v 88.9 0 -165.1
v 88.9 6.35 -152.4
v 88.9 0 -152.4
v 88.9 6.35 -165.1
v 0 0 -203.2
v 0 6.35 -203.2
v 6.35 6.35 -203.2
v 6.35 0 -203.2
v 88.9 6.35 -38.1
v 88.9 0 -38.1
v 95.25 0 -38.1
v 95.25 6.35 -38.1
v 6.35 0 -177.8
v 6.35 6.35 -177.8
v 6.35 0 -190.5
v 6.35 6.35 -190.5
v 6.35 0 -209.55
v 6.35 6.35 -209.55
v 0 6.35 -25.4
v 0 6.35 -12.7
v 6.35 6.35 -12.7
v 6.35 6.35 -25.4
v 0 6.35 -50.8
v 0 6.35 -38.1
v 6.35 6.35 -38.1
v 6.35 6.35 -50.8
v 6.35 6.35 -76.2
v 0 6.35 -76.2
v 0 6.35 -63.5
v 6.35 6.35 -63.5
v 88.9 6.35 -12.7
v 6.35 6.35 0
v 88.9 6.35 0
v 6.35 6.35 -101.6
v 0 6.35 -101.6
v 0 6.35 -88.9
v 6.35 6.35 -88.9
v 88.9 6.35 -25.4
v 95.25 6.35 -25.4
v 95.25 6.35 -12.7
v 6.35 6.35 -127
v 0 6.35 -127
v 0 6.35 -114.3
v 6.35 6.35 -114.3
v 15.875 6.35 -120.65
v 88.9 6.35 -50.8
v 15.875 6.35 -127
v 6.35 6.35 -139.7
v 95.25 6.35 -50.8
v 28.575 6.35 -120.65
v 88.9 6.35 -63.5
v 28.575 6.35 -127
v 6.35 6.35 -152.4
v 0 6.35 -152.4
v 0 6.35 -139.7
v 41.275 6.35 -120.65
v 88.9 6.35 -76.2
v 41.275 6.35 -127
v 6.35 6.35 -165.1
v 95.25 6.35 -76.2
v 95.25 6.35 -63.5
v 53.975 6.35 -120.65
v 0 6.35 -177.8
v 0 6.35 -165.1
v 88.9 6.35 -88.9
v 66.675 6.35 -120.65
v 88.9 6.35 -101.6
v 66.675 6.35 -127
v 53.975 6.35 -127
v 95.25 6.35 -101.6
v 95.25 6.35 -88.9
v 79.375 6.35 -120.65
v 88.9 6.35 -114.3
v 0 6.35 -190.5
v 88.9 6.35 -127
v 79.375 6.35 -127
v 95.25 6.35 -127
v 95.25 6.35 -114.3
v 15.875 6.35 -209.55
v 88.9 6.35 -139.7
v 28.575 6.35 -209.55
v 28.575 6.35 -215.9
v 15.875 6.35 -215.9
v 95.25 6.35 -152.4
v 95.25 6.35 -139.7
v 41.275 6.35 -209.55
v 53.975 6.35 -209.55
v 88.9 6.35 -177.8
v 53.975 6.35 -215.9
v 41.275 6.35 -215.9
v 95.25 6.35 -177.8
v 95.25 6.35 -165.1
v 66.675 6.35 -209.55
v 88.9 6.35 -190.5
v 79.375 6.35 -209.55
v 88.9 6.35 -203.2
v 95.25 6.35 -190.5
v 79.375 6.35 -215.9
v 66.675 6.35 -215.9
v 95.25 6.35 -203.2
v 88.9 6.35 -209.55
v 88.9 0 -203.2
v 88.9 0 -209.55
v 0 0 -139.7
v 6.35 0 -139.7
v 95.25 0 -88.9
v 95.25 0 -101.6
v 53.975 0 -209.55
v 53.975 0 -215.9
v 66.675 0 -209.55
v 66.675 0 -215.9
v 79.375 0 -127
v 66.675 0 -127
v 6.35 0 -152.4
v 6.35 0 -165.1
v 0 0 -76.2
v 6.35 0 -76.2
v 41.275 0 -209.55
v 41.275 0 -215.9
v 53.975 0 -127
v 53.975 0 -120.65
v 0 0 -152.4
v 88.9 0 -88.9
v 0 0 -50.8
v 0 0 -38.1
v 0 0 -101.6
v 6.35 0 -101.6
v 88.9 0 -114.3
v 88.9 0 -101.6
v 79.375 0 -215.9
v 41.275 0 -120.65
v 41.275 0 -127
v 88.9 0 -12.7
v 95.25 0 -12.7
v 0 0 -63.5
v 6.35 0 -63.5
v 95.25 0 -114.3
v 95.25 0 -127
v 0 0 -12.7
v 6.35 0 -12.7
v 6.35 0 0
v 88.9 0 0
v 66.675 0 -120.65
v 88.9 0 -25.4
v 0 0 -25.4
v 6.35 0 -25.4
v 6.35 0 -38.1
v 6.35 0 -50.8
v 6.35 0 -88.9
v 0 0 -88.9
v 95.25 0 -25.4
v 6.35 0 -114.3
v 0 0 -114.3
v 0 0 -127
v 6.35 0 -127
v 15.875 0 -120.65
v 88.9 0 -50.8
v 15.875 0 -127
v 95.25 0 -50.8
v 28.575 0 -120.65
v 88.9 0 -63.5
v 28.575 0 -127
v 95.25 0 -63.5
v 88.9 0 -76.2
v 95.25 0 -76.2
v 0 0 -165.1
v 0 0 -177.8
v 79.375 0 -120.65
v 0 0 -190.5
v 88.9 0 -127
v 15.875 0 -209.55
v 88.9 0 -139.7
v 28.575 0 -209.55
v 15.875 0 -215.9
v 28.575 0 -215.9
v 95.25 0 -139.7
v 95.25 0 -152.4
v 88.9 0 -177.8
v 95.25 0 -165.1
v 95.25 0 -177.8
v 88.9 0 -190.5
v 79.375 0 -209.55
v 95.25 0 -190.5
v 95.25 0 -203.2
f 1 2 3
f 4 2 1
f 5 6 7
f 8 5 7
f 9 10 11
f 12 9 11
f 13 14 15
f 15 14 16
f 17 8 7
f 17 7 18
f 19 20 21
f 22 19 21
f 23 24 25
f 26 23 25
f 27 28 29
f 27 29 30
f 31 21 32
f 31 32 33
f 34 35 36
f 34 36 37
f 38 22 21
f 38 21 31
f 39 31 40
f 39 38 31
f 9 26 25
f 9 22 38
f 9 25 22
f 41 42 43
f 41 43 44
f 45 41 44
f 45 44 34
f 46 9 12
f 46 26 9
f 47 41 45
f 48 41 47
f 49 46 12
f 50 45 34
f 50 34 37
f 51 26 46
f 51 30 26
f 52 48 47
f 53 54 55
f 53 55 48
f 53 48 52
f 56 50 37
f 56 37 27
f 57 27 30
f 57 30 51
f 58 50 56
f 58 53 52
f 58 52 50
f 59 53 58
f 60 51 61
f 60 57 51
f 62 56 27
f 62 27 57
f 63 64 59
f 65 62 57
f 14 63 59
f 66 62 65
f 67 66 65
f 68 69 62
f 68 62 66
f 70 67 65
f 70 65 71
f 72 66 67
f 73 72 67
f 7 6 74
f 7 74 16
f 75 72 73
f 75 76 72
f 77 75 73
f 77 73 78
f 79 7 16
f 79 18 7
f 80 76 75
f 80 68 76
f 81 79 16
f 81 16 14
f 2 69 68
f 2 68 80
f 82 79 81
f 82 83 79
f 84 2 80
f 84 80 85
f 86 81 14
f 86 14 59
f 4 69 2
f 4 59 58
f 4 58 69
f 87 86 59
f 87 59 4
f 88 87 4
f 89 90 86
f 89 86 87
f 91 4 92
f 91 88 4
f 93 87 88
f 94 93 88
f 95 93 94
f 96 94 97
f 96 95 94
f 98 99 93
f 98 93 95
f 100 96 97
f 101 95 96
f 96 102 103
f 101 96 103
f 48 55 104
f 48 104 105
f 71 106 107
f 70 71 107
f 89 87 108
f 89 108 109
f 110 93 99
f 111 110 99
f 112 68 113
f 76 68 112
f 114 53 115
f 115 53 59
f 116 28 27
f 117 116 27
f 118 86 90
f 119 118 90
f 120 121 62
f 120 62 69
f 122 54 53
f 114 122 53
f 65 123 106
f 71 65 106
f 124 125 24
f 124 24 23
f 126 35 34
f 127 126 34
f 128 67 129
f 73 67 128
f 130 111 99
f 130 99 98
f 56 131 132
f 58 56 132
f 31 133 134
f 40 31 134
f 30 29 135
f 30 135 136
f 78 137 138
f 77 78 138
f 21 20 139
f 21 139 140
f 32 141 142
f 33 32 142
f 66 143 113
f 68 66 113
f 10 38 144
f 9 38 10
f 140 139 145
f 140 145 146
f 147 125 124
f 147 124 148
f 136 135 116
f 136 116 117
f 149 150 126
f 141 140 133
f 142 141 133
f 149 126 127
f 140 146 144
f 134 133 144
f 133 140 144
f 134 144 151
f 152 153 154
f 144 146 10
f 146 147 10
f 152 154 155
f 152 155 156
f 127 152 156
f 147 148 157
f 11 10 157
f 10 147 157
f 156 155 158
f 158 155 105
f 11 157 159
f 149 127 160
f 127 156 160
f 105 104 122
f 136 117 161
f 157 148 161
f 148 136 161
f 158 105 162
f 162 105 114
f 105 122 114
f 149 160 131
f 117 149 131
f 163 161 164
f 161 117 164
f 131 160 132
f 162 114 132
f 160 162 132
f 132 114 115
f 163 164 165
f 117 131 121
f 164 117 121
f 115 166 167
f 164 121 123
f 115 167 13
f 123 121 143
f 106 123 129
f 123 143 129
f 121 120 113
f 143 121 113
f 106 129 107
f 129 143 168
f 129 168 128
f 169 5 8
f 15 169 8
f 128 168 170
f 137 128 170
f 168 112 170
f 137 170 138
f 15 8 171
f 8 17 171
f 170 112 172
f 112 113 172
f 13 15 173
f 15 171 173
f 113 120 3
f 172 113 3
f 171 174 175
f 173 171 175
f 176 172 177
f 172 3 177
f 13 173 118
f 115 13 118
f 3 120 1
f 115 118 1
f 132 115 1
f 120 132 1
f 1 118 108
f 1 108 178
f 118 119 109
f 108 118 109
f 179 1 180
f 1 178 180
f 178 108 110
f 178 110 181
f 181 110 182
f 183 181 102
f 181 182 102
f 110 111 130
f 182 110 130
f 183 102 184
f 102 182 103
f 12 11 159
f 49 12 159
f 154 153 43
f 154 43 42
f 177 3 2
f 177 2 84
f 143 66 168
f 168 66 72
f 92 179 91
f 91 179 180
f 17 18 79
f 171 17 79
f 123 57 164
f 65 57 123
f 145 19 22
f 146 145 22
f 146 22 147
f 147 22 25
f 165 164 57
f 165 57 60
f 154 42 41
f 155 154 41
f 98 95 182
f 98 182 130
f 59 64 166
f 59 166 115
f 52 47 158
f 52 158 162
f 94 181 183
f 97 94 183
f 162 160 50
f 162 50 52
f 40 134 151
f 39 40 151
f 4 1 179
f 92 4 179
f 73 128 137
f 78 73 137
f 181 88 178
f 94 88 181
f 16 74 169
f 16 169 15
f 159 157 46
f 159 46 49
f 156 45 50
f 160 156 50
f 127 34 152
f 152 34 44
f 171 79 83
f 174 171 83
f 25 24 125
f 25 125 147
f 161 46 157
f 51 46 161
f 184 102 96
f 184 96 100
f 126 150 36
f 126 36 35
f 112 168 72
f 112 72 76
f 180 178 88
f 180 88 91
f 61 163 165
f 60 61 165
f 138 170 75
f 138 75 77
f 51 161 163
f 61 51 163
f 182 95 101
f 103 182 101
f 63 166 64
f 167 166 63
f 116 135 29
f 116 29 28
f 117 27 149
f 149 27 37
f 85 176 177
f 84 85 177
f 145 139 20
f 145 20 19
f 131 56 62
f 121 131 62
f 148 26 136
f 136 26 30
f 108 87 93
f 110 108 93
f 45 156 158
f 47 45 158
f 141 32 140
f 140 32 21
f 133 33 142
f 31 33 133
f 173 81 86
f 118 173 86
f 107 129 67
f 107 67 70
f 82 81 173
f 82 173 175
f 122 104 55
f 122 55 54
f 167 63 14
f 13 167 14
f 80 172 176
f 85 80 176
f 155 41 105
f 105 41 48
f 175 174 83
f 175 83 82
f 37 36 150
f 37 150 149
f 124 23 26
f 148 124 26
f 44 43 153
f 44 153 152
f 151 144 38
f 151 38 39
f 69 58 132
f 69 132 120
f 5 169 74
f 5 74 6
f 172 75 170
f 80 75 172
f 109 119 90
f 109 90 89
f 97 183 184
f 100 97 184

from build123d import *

# Parameters (mm, degrees)
SKETCH1_W           = 95.25
SKETCH1_H           = 215.9
BOSS_EXTRUDE1_DEPTH = 6.35
SKETCH2_W           = 6.35
SKETCH2_H           = 12.7
CUT_EXTRUDE1_DEPTH  = 7.35
LPATTERN1_COUNT     = 10
LPATTERN1_PITCH     = 25.4
SKETCH3_W           = 12.7
SKETCH3_H           = 6.35
CUT_EXTRUDE2_DEPTH  = 7.35
LPATTERN2_COUNT     = 2
LPATTERN2_PITCH     = 25.4
LPATTERN2_COL_COUNT = 3
LPATTERN2_COL_PITCH = 25.4
SKETCH4_W           = 12.7
SKETCH4_H           = 6.35
CUT_EXTRUDE3_DEPTH  = 7.35


with BuildPart() as part:
    # Sketch1 → Boss-Extrude1 (new body)
    with BuildSketch(Plane(origin=(0, 0, 0), x_dir=(1, 0, 0), z_dir=(0, 1, 0))):
        with Locations((47.625, 107.95)):
            Rectangle(SKETCH1_W, SKETCH1_H)
    extrude(amount=BOSS_EXTRUDE1_DEPTH)

    # Sketch2 → Cut-Extrude1 (cut, through all)
    with BuildSketch(Plane(origin=(0, 6.35, 0), x_dir=(1, 0, 0), z_dir=(0, 1, 0))):
        with Locations((3.175, 209.55)):
            Rectangle(SKETCH2_W, SKETCH2_H)
        with Locations((92.075, 209.55)):
            Rectangle(SKETCH2_W, SKETCH2_H)
    cut_extrude1 = extrude(amount=-CUT_EXTRUDE1_DEPTH, mode=Mode.SUBTRACT)

    # LPattern1: Cut-Extrude1 ×10
    with Locations(*[(0, 0, i * LPATTERN1_PITCH) for i in range(1, LPATTERN1_COUNT)]):
        add(cut_extrude1, mode=Mode.SUBTRACT)

    # Sketch3 → Cut-Extrude2 (cut, through all)
    with BuildSketch(Plane(origin=(0, 6.35, 0), x_dir=(1, 0, 0), z_dir=(0, 1, 0))):
        with Locations((34.925, 212.725)):
            Rectangle(SKETCH3_W, SKETCH3_H)
    cut_extrude2 = extrude(amount=-CUT_EXTRUDE2_DEPTH, mode=Mode.SUBTRACT)

    # LPattern2: Cut-Extrude2 ×2
    with Locations(*[(-i * LPATTERN2_PITCH, 0, 0) for i in range(1, LPATTERN2_COUNT)]):
        add(cut_extrude2, mode=Mode.SUBTRACT)

    # LPattern2 col: Cut-Extrude2 ×3
    with Locations(*[(i * LPATTERN2_COL_PITCH, 0, 0) for i in range(1, LPATTERN2_COL_COUNT)]):
        add(cut_extrude2, mode=Mode.SUBTRACT)

    # Sketch4 → Cut-Extrude3 (cut, through all)
    with BuildSketch(Plane(origin=(0, 6.35, 0), x_dir=(1, 0, 0), z_dir=(0, 1, 0))):
        with Locations((22.225, 123.825)):
            Rectangle(SKETCH4_W, SKETCH4_H)
        with Locations((47.625, 123.825)):
            Rectangle(SKETCH4_W, SKETCH4_H)
        with Locations((73.025, 123.825)):
            Rectangle(SKETCH4_W, SKETCH4_H)
    extrude(amount=-CUT_EXTRUDE3_DEPTH, mode=Mode.SUBTRACT)


solid = part.part
